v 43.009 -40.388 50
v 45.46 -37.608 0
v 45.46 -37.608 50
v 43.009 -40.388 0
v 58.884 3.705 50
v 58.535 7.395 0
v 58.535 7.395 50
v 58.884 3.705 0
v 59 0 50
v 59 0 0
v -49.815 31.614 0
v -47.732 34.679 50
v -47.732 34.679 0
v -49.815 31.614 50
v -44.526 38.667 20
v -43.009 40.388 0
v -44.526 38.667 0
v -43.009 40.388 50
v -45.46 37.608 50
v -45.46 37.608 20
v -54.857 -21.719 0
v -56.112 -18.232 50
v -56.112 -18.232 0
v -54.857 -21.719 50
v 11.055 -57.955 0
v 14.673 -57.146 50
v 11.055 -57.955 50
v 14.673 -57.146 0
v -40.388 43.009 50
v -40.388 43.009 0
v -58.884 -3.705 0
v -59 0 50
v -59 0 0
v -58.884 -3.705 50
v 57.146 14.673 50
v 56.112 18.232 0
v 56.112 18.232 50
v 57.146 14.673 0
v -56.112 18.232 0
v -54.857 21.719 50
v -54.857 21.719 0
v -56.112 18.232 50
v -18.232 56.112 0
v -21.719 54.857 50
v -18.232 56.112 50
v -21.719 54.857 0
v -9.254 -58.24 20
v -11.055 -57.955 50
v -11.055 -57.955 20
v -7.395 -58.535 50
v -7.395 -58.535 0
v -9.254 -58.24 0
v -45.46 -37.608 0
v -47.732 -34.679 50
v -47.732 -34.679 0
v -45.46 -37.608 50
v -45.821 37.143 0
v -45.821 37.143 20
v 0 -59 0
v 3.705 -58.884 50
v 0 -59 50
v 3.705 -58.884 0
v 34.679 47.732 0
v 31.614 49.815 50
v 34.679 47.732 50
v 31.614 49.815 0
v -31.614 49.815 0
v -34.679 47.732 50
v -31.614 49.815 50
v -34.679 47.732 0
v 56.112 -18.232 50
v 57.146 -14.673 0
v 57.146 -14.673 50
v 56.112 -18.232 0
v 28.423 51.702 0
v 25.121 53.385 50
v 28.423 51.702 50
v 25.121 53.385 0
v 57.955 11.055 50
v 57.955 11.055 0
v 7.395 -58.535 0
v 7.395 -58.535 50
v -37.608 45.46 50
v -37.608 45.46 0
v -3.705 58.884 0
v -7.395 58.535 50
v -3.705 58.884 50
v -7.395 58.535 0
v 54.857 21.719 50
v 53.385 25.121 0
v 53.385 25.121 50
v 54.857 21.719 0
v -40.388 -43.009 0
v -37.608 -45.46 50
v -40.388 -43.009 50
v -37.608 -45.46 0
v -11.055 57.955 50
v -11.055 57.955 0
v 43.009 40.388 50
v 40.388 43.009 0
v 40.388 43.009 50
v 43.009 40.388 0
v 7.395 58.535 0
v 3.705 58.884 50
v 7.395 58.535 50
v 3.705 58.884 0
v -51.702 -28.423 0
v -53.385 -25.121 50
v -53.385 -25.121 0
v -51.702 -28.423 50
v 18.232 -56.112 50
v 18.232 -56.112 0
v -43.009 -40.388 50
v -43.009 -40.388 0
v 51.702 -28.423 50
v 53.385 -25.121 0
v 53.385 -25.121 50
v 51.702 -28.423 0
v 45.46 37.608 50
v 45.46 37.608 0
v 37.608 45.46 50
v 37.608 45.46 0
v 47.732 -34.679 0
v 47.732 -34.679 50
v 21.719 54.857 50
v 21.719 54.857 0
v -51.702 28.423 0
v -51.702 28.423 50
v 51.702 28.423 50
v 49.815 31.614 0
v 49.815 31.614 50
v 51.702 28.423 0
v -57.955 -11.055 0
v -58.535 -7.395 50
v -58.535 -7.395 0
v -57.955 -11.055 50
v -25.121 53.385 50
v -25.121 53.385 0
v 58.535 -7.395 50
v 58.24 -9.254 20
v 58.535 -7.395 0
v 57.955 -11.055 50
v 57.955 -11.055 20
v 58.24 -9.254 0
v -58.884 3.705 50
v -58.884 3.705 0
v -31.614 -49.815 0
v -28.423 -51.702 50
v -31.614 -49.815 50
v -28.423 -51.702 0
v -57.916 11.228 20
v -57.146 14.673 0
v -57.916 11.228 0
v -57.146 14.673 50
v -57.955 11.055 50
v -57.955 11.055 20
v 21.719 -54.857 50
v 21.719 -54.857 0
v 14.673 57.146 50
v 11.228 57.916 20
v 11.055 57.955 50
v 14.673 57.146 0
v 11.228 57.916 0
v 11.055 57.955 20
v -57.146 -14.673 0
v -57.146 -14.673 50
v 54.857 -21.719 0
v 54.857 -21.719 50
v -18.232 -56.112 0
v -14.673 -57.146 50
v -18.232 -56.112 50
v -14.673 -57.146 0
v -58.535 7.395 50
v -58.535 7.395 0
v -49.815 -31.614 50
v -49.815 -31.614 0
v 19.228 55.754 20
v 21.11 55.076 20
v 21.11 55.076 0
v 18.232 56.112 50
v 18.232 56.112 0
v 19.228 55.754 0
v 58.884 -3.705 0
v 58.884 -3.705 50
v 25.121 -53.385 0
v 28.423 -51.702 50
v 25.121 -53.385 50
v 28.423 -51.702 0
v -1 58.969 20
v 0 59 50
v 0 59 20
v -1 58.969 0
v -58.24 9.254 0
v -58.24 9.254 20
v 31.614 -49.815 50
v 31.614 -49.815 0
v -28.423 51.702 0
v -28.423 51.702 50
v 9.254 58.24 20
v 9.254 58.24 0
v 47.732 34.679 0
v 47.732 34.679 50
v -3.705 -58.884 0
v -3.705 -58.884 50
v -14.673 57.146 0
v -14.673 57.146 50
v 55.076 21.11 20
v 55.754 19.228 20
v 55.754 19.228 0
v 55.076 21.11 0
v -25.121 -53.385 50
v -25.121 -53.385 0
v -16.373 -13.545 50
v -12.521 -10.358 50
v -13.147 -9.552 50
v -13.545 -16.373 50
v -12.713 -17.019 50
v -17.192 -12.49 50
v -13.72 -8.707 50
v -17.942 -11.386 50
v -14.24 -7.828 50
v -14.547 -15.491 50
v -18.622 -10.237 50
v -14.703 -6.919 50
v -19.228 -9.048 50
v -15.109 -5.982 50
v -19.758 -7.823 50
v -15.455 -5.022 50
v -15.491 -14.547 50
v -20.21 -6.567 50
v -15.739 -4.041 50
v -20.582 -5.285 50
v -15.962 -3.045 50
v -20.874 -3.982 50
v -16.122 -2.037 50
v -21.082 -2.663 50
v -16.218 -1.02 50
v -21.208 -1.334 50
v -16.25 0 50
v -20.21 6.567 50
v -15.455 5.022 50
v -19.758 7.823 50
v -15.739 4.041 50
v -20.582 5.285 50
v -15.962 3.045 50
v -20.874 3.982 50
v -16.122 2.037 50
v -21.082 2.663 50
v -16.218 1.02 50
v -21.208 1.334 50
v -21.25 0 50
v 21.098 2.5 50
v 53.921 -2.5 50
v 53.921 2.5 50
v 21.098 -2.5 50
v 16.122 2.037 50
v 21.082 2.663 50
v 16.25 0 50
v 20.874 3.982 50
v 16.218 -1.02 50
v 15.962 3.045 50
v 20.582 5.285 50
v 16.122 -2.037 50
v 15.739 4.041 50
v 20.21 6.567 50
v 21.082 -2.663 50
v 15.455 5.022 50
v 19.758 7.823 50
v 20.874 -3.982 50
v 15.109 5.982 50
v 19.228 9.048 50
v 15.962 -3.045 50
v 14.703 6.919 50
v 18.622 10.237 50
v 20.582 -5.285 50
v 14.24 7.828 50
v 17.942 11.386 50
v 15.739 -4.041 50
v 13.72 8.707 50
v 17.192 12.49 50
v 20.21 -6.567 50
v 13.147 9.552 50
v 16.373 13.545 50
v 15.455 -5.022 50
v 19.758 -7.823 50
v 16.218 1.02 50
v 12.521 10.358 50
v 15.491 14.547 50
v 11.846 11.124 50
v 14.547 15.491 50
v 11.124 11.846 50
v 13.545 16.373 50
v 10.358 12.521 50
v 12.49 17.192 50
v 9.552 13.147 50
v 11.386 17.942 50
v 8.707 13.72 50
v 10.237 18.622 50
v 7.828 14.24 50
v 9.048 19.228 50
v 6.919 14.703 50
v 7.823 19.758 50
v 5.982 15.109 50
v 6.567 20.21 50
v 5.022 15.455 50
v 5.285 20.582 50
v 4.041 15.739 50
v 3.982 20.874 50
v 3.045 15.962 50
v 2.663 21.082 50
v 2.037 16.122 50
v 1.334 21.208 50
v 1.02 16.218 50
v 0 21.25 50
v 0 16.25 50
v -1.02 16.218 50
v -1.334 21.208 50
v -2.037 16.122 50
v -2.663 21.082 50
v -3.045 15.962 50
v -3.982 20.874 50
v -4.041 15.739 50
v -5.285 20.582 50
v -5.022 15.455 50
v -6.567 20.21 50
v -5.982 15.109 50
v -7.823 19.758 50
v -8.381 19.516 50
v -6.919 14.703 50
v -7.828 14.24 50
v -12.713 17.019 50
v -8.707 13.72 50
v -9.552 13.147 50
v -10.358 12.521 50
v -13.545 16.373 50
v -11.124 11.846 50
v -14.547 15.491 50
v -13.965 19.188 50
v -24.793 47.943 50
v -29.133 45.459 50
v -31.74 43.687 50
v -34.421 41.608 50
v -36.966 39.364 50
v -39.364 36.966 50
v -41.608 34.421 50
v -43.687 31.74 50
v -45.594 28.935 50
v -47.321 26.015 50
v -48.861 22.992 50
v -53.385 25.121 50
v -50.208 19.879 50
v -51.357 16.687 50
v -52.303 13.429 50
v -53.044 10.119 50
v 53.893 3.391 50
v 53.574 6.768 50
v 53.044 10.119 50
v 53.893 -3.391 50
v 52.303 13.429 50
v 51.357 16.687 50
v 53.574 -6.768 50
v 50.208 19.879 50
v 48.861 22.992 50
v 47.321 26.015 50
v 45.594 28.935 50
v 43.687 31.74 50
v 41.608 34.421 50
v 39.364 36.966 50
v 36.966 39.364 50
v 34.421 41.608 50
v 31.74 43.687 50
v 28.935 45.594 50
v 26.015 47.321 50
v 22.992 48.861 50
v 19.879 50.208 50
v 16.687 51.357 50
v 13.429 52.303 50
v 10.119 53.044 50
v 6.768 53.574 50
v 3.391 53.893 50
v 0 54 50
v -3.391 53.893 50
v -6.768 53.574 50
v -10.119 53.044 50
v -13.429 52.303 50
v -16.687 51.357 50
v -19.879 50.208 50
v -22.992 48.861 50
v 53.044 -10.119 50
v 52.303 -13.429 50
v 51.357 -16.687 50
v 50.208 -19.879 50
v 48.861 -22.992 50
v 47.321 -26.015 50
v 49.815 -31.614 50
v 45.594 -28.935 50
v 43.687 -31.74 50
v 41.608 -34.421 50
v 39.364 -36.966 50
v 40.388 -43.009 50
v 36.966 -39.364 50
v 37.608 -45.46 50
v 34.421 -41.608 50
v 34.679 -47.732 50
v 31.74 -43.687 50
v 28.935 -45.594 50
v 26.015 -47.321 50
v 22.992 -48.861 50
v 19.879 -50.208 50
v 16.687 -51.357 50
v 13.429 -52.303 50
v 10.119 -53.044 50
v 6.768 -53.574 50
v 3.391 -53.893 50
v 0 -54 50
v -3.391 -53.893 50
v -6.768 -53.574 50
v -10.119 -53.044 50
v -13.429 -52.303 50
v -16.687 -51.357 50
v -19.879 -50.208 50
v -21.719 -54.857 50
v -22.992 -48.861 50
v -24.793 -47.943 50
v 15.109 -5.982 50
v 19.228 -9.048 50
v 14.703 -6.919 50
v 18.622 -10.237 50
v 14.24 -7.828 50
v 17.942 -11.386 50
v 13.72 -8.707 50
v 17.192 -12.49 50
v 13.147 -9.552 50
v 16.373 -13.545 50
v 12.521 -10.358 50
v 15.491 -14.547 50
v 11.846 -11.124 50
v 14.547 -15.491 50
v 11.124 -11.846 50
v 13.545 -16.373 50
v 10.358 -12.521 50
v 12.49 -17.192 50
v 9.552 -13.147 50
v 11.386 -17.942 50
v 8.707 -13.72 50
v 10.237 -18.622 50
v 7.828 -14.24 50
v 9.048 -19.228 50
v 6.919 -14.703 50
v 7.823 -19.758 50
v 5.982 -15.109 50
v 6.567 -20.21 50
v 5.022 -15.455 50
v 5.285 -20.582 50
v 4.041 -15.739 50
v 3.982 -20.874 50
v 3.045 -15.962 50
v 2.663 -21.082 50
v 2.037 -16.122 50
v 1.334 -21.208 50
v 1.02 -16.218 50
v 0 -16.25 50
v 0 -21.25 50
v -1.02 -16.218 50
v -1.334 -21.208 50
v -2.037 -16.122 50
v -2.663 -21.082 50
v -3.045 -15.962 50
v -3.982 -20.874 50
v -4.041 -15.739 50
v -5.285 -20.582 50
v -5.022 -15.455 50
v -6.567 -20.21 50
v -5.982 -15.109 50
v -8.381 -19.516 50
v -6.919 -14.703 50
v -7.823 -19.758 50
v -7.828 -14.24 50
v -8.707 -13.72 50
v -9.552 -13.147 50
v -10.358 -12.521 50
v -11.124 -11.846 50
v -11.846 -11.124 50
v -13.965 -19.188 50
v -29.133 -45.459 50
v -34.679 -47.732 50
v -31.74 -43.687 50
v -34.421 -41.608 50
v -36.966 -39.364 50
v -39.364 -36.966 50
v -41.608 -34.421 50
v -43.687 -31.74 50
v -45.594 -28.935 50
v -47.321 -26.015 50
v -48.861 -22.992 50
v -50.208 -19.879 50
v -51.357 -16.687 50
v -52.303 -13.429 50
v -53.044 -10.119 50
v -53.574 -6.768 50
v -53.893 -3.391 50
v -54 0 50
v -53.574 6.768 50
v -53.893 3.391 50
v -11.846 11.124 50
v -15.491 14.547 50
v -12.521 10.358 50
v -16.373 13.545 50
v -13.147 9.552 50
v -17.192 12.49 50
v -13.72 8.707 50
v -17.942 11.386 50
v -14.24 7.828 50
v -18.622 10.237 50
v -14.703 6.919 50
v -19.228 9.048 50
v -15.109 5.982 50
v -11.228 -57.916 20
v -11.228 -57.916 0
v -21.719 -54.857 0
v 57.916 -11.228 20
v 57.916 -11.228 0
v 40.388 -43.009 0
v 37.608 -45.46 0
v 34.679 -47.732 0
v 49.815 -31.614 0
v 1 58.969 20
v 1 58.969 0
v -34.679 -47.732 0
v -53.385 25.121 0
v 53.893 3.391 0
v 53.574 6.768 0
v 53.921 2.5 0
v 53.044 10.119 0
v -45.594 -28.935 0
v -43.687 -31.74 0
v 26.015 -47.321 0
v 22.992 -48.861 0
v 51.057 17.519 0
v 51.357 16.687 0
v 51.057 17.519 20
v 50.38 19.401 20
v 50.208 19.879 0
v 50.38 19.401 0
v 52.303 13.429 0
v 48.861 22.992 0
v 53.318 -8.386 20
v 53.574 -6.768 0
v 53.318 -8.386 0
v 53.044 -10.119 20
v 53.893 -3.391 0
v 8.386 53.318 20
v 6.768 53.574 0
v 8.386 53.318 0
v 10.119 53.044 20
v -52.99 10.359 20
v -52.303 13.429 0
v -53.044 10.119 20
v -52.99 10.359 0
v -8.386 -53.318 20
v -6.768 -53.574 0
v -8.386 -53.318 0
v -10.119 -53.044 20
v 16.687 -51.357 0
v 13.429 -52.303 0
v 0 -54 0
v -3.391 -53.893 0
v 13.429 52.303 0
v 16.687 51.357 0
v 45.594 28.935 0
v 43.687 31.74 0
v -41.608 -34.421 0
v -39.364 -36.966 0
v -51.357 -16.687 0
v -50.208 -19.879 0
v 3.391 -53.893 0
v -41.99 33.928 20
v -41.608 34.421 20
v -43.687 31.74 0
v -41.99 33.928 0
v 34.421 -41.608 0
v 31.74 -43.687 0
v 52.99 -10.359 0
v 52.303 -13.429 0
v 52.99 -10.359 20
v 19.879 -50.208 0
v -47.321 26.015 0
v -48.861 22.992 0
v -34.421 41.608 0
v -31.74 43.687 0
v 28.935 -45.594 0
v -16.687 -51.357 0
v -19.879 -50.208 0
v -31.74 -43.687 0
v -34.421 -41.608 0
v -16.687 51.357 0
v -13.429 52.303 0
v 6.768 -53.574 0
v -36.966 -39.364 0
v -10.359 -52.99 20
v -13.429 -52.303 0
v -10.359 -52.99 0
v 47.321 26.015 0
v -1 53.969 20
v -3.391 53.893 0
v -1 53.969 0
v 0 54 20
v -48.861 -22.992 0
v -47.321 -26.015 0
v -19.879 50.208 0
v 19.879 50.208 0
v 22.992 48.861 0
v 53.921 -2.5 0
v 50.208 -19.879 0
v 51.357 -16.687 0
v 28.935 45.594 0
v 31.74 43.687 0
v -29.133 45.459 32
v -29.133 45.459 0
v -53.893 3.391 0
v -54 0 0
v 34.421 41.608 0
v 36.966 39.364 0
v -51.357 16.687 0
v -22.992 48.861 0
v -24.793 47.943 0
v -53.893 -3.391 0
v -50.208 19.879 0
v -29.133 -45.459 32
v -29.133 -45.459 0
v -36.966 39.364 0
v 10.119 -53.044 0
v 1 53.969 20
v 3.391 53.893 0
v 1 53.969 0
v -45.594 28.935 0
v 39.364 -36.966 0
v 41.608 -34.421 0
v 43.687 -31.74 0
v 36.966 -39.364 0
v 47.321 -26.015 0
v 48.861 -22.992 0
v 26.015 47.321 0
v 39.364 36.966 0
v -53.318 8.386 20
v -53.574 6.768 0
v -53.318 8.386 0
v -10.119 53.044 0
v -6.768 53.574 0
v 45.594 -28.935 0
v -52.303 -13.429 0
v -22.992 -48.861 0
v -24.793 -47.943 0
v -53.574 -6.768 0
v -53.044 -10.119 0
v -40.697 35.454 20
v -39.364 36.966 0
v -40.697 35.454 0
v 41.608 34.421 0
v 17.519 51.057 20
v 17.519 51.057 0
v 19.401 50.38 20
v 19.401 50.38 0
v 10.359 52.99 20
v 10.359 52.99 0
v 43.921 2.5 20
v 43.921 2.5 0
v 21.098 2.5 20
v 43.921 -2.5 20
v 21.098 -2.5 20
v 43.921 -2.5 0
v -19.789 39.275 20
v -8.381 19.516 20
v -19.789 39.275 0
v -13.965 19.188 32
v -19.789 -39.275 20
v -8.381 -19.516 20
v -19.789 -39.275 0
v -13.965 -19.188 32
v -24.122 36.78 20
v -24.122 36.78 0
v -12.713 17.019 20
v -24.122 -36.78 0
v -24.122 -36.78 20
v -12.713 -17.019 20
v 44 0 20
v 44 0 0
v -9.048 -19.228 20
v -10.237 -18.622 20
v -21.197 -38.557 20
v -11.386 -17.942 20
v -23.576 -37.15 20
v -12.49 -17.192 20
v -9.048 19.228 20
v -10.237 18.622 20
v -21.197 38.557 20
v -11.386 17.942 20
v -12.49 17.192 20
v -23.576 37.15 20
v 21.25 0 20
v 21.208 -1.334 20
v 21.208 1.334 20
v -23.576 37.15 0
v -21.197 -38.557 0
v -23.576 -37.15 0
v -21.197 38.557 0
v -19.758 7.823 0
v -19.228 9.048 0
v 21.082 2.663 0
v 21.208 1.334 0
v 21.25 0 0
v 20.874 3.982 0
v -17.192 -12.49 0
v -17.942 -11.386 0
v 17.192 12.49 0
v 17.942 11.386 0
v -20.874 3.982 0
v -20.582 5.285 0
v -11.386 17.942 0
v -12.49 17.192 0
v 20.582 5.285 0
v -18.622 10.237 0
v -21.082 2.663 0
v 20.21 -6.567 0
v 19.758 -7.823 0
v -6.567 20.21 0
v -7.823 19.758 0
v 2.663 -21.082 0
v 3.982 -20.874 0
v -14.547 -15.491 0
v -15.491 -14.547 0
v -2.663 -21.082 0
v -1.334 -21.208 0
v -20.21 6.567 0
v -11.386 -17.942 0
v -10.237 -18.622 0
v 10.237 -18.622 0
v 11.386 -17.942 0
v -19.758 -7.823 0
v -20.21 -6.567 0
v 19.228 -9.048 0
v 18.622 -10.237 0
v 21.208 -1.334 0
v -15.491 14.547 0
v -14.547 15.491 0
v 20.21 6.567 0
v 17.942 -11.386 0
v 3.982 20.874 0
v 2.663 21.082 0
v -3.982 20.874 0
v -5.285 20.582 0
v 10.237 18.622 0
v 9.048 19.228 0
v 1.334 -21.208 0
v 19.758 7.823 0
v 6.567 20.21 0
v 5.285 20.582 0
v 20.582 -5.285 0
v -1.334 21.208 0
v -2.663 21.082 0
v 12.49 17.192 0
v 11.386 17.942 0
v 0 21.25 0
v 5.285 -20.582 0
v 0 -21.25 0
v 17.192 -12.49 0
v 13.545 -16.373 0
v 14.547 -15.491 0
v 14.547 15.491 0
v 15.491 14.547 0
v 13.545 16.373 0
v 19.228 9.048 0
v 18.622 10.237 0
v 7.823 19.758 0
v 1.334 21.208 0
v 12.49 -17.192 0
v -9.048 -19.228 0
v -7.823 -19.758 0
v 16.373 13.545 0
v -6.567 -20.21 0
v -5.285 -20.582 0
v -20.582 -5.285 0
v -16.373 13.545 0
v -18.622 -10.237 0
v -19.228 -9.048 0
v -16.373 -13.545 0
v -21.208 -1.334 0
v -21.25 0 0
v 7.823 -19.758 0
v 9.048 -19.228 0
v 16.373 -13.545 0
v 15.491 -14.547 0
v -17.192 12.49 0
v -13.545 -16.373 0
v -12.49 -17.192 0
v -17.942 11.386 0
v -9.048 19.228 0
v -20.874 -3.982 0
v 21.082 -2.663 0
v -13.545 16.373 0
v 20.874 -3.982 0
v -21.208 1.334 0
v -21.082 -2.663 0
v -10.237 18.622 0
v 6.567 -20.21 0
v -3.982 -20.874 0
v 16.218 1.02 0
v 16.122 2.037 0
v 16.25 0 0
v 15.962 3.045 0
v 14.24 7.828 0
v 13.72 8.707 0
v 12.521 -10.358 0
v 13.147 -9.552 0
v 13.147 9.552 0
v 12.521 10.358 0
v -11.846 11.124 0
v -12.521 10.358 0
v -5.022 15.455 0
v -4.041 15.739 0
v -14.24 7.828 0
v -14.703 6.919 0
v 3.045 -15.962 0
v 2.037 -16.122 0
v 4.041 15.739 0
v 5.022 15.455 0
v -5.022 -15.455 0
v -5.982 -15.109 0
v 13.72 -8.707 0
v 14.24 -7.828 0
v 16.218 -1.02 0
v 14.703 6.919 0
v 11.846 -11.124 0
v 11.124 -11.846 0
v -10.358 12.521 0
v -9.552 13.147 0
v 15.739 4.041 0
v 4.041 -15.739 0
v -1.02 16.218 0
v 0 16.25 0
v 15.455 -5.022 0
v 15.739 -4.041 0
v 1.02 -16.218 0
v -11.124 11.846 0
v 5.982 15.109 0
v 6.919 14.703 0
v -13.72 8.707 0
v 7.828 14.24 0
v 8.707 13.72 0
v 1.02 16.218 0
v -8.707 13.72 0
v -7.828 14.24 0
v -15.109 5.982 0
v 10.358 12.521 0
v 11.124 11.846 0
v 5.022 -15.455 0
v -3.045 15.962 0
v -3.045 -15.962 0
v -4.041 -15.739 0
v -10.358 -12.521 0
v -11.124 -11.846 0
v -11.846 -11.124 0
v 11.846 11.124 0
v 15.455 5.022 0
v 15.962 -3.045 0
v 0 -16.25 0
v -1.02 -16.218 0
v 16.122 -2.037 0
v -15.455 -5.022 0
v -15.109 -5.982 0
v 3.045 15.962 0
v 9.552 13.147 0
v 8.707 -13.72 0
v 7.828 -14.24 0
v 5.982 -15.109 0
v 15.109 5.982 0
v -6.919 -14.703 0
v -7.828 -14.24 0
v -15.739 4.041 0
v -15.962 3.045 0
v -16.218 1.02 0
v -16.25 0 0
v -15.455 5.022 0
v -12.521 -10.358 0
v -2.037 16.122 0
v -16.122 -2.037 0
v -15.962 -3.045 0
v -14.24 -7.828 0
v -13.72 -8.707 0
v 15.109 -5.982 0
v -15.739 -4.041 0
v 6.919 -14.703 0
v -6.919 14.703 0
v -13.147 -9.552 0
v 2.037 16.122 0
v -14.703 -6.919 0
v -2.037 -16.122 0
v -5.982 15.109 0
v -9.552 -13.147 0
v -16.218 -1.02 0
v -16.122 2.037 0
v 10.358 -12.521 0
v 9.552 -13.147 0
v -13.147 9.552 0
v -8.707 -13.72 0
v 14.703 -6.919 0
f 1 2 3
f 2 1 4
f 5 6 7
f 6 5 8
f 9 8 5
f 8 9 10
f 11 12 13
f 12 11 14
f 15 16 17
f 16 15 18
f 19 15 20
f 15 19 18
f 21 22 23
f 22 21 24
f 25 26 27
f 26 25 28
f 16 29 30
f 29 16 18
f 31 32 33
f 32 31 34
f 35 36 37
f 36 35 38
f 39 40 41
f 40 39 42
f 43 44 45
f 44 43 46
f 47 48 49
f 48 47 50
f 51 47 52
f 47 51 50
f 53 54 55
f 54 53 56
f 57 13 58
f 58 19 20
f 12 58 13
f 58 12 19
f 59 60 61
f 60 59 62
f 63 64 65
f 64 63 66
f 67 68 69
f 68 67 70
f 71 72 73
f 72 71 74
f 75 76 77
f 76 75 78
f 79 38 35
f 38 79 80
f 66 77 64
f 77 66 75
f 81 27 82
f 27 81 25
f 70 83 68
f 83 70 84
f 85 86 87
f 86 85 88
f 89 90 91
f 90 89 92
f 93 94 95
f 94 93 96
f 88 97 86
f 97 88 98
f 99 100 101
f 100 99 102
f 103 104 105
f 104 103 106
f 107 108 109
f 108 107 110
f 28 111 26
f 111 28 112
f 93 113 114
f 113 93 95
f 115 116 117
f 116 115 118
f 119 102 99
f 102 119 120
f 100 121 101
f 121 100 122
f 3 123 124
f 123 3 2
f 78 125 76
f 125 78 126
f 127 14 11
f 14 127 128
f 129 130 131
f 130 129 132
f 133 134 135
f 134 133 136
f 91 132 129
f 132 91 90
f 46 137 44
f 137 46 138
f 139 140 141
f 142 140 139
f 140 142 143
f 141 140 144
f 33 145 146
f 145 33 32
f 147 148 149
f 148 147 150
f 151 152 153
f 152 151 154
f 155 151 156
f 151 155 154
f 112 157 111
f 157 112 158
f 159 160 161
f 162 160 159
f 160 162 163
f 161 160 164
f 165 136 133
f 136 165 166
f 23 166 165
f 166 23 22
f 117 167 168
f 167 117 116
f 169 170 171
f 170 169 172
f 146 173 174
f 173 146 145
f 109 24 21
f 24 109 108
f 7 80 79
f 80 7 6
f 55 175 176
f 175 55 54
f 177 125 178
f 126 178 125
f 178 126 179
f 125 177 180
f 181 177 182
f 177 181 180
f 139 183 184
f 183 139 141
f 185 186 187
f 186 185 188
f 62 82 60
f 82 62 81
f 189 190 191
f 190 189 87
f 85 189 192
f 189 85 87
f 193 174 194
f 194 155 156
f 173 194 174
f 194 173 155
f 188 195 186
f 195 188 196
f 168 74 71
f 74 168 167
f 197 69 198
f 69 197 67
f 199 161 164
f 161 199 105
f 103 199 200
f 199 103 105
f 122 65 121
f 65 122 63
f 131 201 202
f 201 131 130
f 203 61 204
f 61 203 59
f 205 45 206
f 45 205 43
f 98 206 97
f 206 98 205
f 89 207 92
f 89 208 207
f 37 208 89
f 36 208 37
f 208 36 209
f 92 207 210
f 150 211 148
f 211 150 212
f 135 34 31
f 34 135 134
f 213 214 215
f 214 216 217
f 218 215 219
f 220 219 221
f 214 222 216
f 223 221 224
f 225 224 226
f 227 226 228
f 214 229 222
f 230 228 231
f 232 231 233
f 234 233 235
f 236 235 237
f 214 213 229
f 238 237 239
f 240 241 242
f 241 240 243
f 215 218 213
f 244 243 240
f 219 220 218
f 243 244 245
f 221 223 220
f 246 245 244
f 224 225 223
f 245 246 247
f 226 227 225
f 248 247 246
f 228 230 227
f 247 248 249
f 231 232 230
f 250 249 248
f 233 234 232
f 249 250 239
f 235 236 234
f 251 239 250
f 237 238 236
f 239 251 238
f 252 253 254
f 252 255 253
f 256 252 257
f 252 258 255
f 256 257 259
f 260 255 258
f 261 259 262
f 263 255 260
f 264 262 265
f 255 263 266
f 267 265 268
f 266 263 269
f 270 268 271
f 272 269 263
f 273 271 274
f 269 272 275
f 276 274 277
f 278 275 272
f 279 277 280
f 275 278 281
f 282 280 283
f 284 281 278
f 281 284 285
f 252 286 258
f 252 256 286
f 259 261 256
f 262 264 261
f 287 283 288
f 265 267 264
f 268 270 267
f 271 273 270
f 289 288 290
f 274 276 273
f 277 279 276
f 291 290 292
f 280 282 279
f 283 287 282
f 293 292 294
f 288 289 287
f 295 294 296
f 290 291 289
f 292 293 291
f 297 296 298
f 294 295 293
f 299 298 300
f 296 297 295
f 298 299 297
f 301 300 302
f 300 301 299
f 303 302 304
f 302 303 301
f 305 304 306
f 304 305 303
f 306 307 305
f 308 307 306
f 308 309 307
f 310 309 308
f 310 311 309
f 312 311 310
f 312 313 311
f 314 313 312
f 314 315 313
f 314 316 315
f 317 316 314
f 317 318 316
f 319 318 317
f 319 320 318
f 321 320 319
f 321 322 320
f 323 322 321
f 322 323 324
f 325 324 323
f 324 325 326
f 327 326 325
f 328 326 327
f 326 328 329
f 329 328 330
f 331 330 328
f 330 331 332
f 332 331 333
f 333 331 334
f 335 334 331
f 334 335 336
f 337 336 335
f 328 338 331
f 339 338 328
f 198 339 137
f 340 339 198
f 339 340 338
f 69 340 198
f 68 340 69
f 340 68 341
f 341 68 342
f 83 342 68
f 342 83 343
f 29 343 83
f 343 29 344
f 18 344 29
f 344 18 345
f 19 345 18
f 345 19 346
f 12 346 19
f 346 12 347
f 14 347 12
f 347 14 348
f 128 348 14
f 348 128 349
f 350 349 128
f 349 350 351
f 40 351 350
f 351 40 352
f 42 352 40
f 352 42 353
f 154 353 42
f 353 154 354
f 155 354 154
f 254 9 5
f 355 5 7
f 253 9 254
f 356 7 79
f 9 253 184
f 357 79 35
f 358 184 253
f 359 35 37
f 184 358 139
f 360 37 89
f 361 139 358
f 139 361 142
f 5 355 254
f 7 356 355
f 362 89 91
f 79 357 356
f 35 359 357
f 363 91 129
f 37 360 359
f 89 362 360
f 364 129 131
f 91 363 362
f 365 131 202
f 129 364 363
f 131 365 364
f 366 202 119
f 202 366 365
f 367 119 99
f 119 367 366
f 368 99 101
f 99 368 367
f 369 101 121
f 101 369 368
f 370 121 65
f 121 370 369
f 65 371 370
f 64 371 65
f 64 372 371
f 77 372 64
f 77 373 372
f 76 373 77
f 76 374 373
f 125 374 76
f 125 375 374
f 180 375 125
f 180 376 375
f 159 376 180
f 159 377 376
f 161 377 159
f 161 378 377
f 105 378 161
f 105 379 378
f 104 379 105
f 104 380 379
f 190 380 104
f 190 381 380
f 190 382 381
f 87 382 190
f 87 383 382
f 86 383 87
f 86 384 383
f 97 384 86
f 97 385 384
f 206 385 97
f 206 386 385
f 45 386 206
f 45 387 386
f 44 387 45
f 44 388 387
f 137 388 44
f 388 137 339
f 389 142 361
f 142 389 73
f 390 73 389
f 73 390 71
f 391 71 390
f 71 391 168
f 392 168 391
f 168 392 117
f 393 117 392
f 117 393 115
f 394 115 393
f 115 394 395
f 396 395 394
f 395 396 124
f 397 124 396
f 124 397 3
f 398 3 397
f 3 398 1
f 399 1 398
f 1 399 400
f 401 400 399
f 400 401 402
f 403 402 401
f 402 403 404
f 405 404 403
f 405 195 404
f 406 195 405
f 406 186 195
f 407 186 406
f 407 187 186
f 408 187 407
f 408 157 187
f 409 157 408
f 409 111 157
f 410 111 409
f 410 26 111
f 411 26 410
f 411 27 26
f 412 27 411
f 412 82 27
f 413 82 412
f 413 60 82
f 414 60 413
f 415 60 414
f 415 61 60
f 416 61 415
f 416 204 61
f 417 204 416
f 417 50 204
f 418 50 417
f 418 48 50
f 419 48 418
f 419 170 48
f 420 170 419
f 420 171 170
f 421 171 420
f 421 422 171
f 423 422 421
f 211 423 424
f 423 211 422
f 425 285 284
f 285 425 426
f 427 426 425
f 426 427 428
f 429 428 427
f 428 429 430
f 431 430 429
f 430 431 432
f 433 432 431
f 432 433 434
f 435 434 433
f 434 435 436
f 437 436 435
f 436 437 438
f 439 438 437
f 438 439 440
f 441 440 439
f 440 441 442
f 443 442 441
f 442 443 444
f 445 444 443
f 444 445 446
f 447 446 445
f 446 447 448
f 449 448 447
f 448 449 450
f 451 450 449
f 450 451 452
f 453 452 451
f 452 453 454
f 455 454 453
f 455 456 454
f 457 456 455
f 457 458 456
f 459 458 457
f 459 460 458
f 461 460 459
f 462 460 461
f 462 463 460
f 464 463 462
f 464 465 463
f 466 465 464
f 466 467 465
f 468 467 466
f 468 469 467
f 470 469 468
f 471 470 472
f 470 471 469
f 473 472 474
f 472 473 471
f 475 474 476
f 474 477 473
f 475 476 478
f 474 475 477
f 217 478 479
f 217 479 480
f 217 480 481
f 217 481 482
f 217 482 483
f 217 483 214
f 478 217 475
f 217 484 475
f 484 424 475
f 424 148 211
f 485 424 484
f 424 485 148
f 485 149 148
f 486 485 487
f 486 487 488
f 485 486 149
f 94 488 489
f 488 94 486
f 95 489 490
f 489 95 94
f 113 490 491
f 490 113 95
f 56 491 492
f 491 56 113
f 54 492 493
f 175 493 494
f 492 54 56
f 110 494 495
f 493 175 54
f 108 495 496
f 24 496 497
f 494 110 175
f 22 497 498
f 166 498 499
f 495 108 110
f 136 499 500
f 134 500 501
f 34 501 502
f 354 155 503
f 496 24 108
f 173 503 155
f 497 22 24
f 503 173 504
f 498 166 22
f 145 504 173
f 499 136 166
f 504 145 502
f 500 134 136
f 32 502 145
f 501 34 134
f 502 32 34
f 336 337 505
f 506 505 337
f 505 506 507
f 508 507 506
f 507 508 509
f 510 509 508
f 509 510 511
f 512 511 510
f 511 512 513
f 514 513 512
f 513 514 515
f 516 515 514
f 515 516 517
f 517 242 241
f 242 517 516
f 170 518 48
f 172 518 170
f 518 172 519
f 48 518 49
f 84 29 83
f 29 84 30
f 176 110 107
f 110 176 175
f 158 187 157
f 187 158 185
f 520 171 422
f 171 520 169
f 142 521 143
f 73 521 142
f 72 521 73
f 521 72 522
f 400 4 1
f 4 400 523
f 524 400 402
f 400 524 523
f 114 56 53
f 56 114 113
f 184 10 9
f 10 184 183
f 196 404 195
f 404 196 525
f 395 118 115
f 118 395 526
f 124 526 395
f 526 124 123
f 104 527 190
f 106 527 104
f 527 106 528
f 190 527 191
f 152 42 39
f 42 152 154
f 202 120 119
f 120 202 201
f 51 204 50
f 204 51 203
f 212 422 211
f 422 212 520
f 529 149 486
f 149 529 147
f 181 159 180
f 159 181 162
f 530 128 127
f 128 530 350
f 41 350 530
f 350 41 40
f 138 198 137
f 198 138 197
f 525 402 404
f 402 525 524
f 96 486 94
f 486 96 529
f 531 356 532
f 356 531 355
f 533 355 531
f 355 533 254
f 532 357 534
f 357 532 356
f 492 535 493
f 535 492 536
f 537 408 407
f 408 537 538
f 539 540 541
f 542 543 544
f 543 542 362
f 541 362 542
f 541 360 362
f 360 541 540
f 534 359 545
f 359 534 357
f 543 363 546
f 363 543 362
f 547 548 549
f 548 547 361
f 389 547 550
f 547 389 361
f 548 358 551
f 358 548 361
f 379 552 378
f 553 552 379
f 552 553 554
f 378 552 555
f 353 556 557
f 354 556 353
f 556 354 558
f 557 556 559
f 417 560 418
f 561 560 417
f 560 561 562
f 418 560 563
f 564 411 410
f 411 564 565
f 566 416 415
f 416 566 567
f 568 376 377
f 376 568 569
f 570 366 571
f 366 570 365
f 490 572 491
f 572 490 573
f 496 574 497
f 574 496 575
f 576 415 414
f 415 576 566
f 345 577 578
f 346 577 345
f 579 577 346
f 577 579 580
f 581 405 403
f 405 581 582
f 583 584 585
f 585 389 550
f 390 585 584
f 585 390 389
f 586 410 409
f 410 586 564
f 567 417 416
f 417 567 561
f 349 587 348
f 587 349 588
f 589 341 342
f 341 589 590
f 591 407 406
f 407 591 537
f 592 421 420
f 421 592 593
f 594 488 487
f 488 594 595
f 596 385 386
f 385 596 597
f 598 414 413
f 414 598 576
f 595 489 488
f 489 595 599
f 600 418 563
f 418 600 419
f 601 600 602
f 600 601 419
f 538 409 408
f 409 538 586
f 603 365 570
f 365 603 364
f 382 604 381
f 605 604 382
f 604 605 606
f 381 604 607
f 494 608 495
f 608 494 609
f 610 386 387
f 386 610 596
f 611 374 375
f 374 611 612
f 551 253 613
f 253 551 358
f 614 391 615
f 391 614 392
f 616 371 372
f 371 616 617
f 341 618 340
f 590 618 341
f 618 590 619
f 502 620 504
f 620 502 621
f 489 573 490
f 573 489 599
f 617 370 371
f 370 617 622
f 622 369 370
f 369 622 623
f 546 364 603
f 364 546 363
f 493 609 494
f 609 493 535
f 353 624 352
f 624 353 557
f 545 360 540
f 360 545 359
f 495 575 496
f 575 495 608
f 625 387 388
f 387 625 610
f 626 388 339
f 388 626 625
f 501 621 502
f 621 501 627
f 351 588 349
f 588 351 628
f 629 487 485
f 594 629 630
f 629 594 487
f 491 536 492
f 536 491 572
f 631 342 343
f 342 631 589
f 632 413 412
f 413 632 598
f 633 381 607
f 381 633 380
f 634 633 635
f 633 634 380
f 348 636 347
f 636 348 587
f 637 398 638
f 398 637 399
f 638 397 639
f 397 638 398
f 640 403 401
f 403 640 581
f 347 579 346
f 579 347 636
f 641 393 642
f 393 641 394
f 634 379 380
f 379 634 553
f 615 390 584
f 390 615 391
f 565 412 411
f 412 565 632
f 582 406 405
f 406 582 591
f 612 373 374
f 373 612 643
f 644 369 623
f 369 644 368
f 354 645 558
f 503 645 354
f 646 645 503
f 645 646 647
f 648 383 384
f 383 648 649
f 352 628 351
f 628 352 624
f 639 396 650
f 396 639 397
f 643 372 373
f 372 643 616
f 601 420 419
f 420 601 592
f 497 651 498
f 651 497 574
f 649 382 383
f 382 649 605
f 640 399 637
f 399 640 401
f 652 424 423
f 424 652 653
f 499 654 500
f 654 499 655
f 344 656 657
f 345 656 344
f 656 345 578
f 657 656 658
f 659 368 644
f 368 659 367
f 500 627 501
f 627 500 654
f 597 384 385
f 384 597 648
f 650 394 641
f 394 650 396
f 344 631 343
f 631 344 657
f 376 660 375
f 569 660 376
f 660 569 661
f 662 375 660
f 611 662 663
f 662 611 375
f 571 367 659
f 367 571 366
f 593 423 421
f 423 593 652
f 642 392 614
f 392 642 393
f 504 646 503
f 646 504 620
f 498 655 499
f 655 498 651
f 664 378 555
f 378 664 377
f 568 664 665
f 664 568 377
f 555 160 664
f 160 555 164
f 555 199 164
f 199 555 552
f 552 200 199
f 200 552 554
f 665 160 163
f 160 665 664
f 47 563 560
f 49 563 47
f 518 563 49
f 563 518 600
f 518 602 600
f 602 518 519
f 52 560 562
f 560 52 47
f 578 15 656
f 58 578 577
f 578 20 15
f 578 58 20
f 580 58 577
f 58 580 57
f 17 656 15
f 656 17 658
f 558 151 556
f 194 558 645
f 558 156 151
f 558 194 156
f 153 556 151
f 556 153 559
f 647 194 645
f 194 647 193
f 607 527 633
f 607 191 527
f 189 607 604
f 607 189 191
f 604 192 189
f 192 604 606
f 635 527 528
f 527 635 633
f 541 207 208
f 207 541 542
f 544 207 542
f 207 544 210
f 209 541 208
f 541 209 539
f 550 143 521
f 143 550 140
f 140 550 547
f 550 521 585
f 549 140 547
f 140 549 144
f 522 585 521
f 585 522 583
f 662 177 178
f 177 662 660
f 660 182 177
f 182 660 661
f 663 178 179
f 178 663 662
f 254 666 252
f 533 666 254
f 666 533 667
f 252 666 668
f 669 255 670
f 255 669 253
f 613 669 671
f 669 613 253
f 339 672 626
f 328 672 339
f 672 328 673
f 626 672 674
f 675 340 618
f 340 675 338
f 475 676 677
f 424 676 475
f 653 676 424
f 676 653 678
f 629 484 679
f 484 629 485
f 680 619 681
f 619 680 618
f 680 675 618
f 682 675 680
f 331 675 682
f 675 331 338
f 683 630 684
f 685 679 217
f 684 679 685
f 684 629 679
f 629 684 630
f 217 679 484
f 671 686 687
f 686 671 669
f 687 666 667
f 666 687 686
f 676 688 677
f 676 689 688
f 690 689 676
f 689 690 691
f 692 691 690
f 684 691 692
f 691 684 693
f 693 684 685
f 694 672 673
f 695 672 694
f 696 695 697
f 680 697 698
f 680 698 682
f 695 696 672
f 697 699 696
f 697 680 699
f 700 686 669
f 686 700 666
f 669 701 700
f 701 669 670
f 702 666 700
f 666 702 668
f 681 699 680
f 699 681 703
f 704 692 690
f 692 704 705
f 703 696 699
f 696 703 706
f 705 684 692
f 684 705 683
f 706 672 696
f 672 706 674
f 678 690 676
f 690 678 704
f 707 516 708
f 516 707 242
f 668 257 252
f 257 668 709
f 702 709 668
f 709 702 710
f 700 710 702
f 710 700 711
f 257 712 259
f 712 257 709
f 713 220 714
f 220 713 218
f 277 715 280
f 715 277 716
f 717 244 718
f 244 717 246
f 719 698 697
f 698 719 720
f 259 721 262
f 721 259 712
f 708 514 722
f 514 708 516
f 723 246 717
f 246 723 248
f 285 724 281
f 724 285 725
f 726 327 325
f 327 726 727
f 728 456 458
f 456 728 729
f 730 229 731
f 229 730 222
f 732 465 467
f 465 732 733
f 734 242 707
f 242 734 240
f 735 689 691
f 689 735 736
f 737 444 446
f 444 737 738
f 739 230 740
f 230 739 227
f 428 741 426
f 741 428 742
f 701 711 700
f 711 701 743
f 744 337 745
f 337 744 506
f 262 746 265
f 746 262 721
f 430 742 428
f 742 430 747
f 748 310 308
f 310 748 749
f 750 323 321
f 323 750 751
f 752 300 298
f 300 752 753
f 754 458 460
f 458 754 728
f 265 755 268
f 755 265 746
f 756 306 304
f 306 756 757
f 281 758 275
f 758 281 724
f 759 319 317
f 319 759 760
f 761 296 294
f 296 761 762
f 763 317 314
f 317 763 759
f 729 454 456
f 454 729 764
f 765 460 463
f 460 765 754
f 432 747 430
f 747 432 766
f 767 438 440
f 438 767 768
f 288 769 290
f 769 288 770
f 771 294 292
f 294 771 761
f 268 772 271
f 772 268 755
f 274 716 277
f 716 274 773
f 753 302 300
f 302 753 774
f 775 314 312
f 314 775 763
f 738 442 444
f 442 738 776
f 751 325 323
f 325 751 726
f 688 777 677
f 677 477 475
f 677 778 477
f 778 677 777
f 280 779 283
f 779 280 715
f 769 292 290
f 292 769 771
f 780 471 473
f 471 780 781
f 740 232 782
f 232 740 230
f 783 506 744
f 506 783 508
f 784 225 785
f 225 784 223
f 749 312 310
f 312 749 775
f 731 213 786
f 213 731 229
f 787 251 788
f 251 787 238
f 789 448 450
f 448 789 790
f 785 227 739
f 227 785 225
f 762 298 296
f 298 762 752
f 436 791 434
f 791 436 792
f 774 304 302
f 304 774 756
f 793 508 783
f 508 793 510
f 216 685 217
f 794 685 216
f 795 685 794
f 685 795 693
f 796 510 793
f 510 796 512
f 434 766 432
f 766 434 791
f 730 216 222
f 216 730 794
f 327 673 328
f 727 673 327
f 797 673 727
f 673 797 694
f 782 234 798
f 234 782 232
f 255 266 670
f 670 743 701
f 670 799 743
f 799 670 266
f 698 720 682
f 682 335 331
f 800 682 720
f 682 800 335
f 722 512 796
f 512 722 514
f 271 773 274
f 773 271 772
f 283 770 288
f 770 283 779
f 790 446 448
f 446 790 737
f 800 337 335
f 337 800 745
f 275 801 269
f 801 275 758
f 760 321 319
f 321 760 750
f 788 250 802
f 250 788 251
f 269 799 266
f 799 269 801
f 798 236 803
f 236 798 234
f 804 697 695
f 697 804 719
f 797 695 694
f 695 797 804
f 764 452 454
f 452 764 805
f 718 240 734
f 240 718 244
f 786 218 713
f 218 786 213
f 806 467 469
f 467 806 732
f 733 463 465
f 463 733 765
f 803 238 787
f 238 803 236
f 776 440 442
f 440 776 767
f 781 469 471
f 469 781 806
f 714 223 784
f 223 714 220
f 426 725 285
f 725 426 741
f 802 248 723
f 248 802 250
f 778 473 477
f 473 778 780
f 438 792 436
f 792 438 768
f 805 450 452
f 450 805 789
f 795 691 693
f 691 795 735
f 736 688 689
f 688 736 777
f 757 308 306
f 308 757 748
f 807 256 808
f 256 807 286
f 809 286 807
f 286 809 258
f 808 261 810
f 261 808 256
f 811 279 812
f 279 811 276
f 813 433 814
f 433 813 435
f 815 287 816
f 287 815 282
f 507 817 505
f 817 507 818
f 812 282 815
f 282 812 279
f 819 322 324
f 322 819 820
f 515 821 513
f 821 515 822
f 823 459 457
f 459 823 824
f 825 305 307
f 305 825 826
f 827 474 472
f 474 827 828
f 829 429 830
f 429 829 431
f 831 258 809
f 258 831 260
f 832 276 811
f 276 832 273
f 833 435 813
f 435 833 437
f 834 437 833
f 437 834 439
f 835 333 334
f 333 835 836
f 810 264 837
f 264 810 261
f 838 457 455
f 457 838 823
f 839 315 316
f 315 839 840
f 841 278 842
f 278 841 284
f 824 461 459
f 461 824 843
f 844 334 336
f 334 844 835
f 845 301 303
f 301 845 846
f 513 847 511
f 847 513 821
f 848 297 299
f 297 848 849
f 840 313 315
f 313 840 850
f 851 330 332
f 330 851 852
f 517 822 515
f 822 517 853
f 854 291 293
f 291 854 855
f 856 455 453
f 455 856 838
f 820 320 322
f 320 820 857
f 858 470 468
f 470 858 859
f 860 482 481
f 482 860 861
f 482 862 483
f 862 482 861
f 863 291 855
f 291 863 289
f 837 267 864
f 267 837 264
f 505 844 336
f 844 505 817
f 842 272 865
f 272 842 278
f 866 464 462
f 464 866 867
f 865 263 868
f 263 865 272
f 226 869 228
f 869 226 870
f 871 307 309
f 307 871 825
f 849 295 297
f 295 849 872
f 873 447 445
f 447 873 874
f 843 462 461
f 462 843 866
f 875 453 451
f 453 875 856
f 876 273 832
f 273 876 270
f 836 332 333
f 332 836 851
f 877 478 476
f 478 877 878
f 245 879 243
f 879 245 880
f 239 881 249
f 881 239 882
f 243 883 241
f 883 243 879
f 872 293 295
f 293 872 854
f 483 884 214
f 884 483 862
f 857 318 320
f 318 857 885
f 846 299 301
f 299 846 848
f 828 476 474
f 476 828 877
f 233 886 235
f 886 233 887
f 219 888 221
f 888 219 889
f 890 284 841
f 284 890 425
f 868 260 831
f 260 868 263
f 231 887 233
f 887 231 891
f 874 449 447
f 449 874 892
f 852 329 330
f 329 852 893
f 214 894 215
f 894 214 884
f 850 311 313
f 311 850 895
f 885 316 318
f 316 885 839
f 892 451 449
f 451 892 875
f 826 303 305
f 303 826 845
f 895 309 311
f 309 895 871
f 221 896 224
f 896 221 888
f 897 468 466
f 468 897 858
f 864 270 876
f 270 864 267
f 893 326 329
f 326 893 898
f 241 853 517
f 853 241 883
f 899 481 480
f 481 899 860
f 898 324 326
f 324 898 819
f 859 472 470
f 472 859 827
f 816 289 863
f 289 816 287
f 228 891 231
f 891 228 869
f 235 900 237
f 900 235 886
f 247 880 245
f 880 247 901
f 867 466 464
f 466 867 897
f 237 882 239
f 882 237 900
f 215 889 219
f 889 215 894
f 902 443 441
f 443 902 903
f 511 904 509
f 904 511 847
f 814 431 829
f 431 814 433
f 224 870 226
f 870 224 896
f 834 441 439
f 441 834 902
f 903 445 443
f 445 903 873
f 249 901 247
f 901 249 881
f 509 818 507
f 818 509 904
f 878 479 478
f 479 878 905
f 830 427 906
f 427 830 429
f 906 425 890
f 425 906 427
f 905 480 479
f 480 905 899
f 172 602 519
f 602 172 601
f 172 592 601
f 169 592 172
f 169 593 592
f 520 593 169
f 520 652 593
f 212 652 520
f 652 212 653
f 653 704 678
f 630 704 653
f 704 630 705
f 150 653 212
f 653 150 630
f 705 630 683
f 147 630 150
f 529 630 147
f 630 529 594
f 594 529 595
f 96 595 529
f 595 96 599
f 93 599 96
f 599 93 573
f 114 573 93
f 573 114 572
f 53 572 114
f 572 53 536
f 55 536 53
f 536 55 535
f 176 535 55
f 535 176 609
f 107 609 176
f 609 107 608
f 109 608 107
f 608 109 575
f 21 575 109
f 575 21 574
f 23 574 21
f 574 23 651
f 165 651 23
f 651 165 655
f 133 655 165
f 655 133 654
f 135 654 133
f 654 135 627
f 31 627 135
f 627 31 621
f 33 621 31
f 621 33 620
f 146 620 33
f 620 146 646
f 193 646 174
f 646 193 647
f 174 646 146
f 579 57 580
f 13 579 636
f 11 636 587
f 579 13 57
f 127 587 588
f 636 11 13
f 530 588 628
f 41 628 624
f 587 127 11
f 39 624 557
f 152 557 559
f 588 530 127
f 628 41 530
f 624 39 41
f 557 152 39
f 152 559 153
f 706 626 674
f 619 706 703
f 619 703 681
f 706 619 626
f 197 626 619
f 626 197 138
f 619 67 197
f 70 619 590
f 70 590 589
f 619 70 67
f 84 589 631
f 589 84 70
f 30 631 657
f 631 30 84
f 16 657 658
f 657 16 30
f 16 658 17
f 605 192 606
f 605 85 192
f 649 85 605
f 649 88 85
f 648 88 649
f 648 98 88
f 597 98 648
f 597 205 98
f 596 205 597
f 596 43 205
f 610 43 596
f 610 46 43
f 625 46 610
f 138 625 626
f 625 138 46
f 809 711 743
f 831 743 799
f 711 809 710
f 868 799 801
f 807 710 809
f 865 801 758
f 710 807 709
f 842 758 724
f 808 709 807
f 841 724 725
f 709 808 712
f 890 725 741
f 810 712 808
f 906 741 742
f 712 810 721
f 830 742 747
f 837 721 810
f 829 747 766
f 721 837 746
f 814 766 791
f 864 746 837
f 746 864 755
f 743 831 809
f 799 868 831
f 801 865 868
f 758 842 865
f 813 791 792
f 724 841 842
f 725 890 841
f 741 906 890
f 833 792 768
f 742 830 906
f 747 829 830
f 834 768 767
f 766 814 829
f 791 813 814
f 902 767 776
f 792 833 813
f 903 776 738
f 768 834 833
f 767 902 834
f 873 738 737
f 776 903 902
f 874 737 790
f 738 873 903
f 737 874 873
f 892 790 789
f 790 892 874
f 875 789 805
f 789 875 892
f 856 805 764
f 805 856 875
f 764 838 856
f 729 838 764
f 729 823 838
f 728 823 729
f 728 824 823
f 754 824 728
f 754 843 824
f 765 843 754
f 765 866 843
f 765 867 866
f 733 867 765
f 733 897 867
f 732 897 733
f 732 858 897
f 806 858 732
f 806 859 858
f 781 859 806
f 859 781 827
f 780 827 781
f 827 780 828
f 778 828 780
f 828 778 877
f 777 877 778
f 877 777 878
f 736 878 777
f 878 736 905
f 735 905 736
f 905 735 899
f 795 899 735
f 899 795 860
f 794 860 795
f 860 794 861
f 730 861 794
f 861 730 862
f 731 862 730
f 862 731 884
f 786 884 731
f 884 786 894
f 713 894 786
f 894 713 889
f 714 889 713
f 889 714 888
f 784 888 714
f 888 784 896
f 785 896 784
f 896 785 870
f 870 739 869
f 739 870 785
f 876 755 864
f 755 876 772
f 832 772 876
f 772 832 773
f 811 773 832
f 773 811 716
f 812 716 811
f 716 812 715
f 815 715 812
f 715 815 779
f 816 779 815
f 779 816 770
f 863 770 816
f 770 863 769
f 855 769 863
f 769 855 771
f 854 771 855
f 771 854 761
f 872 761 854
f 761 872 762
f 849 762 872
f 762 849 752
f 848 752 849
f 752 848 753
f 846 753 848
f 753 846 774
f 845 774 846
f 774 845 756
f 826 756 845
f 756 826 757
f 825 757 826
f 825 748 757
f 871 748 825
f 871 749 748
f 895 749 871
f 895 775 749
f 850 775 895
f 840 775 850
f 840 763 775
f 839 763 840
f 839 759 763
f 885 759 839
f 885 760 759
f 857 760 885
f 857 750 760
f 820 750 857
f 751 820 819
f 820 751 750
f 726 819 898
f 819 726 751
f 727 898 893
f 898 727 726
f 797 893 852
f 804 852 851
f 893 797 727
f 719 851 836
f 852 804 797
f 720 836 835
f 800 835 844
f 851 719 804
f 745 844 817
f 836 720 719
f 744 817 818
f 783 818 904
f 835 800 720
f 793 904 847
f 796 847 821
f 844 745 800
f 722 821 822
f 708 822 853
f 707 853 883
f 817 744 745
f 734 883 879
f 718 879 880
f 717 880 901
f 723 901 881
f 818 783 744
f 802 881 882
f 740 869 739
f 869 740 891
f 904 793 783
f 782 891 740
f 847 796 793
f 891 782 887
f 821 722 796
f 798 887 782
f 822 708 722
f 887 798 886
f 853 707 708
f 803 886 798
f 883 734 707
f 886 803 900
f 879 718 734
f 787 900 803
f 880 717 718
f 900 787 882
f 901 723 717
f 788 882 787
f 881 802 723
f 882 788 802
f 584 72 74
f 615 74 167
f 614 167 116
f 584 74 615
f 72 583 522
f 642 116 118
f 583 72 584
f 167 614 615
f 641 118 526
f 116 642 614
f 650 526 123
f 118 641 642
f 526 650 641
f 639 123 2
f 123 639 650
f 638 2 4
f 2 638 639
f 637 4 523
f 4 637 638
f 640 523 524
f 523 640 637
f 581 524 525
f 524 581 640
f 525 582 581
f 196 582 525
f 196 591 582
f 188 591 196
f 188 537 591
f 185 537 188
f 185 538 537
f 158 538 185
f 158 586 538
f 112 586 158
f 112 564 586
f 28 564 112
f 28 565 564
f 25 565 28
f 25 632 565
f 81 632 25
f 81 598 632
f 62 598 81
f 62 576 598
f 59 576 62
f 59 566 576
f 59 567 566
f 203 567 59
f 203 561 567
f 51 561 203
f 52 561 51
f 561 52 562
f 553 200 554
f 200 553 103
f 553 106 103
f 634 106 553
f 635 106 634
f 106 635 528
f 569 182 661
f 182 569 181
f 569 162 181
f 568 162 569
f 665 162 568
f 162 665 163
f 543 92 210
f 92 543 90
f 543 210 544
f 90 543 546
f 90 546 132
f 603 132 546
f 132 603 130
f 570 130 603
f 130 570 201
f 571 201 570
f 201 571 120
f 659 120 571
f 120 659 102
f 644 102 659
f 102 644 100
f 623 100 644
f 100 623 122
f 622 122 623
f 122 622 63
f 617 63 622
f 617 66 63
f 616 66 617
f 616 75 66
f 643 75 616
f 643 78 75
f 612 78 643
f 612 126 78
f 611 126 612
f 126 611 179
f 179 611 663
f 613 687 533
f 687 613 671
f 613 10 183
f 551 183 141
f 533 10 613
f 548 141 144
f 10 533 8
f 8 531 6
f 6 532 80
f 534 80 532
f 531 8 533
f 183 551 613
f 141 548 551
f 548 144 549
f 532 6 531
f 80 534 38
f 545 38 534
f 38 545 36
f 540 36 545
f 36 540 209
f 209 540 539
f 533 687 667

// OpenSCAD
// OpenSCAD input script
// Created using Claude AI with lot of instructions and fixes.

// SCAD parameter "face number" to approximate ciylinders
$fn = 100;


// Parameters
main_height = 100;
outer_diameter = 118;
inner_diameter = 32.5;
wall_thickness = 5;
num_ribs = 3;
cut_diameter = outer_diameter - 30;
rib_height = 30;

// Spring parameters
spring_thickness = 2;
spring_height = 30;
//spring_width = 30;
spring_gap = 2;
spring_extension = 4;
n_slices = 10;

// strip holes parameters
strip_width = 2;
strip_height = main_height - 2 * rib_height;


strip_angles_ = [0, 180, 300, 270, 350];
angle_zero = 20;
strip_angles = concat(
    [for (a = strip_angles_) angle_zero - a],
    [for (a = strip_angles_) angle_zero + a]);

// Derived parameters
outer_radius = outer_diameter / 2;
inner_radius = inner_diameter / 2;
middle_radius = (outer_radius + inner_radius) / 2;
cut_radius = cut_diameter / 2;

// Calculated spring position
//function chord_height(r, w) = r - sqrt(r*r - (w/2)*(w/2));
//spring_chord_height = chord_height(outer_radius, spring_width);
//spring_offset = outer_radius - spring_thickness/2 - spring_chord_height;


module cylinder_shell(height, radius, thickness) {
    difference() {
        cylinder(h = height, r = radius, center = true);
        cylinder(h = height + 1, r = radius - thickness, center = true);
    }
}

// Outer cylinder shell
module outer_shell() {
    difference() {
        cylinder_shell(main_height, outer_radius, wall_thickness);
        for(angle = strip_angles) {
            rot_angle = (180 / num_ribs + angle) % 360;
            rotate([0, 0, rot_angle])
            translate([outer_radius, 0, 0])
            cube([3*wall_thickness, strip_width, strip_height], center = true);
        }    
    }
}

// Inner cylinder shell
module inner_shell() {
    translate([0, 0, (spring_height +  spring_gap)/2])
    cylinder_shell(main_height + spring_height +  spring_gap, inner_radius + wall_thickness, wall_thickness);
}

// Single rib
module rib() {
    translate([inner_radius, -wall_thickness/2, -main_height/2])
    cube([outer_radius - inner_radius - wall_thickness/2, 
        wall_thickness, 
        main_height]);
}

// Cut cylinder
module cut_cylinder() {
    cylinder(h = main_height - 2*rib_height, r = cut_radius, center = true);
}

// Single spring - box approximation
module spring_approx() {
    cube([spring_thickness, spring_width, spring_height], center = true);
}

/*
module spring_vertical_cut() {
    L = spring_height;
    D = spring_extension;
    radius = (L*L + 4 * D*D) / (8 * D); 
    angle = 2 * acos( (radius - D) / radius );
    
    translate([-(radius - D), 0])
    intersection() {
        difference() {
            circle(radius);
            circle(radius - spring_thickness);
        }
        translate([radius/2, 0])
        square([radius, spring_height], center=true);
    }
}

// Simple planar spring (vertically bent)
module spring() {
    spring_angle = spring_width / outer_radius / 2 / PI * 180;
    rotate_extrude(angle=spring_angle, $fn=100) {
        translate([outer_radius, 0])
        //rotate([90, 0, 0])
        spring_vertical_cut();
    }
}

// Simple planar spring (vertically bent)
module spring_v() {
    points = [
        [-spring_thickness/2, -spring_height/2],
        [spring_thickness/2, -spring_height/2],
        [spring_thickness/2 + spring_extension, 0],  // Bend point
        [spring_thickness/2, spring_height/2],
        [-spring_thickness/2, spring_height/2],
        [-spring_thickness/2 + spring_extension, 0]  // Bend point on the other side
    ];
    
    spring_angle = spring_width / outer_radius / 2 / PI * 180;
    rotate_extrude(angle=spring_angle) {
        translate([outer_radius - spring_thickness/2, 0])
        //rotate([90, 0, 0])
        polygon(points);
    }
}
*/


/*
// Calculate the radius of the spring cylinders
spring_radius = (outer_radius + spring_extension) / (1 + 2 / sqrt(3));

// Function to create a single horizontal cut with varying r_x
module barrel_spring_cut(r_x) {
    union() {
        // Semi-circle result
        difference() {
            circle(spring_radius, $fn=20);
            translate([spring_radius / 2, 0])
            square([spring_radius, 2 * spring_radius], center = true);
        }

        // Ellipse for X>0
        scale([r_x, 1])
        circle(spring_radius, $fn=20);
    }
}

// Function to calculate r_x based on z
function r_x(z) = 1 - (spring_radius - spring_extension) / spring_radius * pow(z / spring_height, 2);

// Module to create the deformed barrel spring using hull operation
module spring_barrel() {
    hull() {
        for (z = [-spring_height/2 : spring_height/n_slices : spring_height/2]) {
            translate([0, 0, z])
            linear_extrude(height = spring_thickness)
            barrel_spring_cut(r_x(z));
        }
    }
}


module horizontal_spring() {
    inner_scale = (spring_radius - spring_thickness) / spring_radius;
    difference(){
        spring_barrel();
        scale([inner_scale, inner_scale, 1])
        spring_barrel();
    }
} */

function r_for_chord(chord, extension) = (chord*chord/4 + extension*extension) / 2 / extension;

module horizontal_spring() {
    // three touching springs, without extension
    spring_radius = outer_radius / (1 + 2 / sqrt(3));
    contact_bump_r = r_for_chord(spring_height, spring_extension)*2/3;

    spring_z_shift = main_height/2 + spring_height/2 + spring_gap;
    translate([2/sqrt(3) * spring_radius, 0, 
                spring_z_shift])
    difference() {
        union() {
            cylinder(h=spring_height, r=spring_radius, center=true);
            translate([spring_radius - contact_bump_r + spring_extension, 0, 0])
            sphere(r=contact_bump_r);
        }
        cylinder(h=4*spring_height, r=spring_radius - spring_thickness, center=true);
    }
    
}

// Main assembly
module main_assembly() {
    union() {
        difference() {
            union() {
                outer_shell();
                for (i = [0:num_ribs-1]) {
                    angle = i * 360 / num_ribs;
                    rotate([0, 0, angle])
                    rib();
                }
                // Add springs
                for (i = [0:num_ribs-1]) {
                    angle = i * 360 / num_ribs;  // Offset by half the angle between ribs
                    rotate([0, 0, angle  + 180 / num_ribs])
                    horizontal_spring();
                    rotate([0, 0, angle])
                    translate([0, 0, spring_height+spring_gap])
                    difference(){
                        rib();
                        translate([outer_radius*0.4, -outer_radius/2, 0])
                        cube([outer_radius, outer_radius, outer_radius]);
                    }
                }
            }
            union() {
                cut_cylinder();
                cylinder(h=3*main_height, r=inner_radius + wall_thickness/2, center=true);
            }
        }
        inner_shell();
    }   
}

 
// Render the assembly
difference() {
    main_assembly();  
    translate([0, 0, -main_height/2])
    cube([3*outer_radius, 3*outer_radius, main_height], center=true);
    translate([0, 0, +main_height])
    cube([3*outer_radius, 3*outer_radius, main_height], center=true);
}
